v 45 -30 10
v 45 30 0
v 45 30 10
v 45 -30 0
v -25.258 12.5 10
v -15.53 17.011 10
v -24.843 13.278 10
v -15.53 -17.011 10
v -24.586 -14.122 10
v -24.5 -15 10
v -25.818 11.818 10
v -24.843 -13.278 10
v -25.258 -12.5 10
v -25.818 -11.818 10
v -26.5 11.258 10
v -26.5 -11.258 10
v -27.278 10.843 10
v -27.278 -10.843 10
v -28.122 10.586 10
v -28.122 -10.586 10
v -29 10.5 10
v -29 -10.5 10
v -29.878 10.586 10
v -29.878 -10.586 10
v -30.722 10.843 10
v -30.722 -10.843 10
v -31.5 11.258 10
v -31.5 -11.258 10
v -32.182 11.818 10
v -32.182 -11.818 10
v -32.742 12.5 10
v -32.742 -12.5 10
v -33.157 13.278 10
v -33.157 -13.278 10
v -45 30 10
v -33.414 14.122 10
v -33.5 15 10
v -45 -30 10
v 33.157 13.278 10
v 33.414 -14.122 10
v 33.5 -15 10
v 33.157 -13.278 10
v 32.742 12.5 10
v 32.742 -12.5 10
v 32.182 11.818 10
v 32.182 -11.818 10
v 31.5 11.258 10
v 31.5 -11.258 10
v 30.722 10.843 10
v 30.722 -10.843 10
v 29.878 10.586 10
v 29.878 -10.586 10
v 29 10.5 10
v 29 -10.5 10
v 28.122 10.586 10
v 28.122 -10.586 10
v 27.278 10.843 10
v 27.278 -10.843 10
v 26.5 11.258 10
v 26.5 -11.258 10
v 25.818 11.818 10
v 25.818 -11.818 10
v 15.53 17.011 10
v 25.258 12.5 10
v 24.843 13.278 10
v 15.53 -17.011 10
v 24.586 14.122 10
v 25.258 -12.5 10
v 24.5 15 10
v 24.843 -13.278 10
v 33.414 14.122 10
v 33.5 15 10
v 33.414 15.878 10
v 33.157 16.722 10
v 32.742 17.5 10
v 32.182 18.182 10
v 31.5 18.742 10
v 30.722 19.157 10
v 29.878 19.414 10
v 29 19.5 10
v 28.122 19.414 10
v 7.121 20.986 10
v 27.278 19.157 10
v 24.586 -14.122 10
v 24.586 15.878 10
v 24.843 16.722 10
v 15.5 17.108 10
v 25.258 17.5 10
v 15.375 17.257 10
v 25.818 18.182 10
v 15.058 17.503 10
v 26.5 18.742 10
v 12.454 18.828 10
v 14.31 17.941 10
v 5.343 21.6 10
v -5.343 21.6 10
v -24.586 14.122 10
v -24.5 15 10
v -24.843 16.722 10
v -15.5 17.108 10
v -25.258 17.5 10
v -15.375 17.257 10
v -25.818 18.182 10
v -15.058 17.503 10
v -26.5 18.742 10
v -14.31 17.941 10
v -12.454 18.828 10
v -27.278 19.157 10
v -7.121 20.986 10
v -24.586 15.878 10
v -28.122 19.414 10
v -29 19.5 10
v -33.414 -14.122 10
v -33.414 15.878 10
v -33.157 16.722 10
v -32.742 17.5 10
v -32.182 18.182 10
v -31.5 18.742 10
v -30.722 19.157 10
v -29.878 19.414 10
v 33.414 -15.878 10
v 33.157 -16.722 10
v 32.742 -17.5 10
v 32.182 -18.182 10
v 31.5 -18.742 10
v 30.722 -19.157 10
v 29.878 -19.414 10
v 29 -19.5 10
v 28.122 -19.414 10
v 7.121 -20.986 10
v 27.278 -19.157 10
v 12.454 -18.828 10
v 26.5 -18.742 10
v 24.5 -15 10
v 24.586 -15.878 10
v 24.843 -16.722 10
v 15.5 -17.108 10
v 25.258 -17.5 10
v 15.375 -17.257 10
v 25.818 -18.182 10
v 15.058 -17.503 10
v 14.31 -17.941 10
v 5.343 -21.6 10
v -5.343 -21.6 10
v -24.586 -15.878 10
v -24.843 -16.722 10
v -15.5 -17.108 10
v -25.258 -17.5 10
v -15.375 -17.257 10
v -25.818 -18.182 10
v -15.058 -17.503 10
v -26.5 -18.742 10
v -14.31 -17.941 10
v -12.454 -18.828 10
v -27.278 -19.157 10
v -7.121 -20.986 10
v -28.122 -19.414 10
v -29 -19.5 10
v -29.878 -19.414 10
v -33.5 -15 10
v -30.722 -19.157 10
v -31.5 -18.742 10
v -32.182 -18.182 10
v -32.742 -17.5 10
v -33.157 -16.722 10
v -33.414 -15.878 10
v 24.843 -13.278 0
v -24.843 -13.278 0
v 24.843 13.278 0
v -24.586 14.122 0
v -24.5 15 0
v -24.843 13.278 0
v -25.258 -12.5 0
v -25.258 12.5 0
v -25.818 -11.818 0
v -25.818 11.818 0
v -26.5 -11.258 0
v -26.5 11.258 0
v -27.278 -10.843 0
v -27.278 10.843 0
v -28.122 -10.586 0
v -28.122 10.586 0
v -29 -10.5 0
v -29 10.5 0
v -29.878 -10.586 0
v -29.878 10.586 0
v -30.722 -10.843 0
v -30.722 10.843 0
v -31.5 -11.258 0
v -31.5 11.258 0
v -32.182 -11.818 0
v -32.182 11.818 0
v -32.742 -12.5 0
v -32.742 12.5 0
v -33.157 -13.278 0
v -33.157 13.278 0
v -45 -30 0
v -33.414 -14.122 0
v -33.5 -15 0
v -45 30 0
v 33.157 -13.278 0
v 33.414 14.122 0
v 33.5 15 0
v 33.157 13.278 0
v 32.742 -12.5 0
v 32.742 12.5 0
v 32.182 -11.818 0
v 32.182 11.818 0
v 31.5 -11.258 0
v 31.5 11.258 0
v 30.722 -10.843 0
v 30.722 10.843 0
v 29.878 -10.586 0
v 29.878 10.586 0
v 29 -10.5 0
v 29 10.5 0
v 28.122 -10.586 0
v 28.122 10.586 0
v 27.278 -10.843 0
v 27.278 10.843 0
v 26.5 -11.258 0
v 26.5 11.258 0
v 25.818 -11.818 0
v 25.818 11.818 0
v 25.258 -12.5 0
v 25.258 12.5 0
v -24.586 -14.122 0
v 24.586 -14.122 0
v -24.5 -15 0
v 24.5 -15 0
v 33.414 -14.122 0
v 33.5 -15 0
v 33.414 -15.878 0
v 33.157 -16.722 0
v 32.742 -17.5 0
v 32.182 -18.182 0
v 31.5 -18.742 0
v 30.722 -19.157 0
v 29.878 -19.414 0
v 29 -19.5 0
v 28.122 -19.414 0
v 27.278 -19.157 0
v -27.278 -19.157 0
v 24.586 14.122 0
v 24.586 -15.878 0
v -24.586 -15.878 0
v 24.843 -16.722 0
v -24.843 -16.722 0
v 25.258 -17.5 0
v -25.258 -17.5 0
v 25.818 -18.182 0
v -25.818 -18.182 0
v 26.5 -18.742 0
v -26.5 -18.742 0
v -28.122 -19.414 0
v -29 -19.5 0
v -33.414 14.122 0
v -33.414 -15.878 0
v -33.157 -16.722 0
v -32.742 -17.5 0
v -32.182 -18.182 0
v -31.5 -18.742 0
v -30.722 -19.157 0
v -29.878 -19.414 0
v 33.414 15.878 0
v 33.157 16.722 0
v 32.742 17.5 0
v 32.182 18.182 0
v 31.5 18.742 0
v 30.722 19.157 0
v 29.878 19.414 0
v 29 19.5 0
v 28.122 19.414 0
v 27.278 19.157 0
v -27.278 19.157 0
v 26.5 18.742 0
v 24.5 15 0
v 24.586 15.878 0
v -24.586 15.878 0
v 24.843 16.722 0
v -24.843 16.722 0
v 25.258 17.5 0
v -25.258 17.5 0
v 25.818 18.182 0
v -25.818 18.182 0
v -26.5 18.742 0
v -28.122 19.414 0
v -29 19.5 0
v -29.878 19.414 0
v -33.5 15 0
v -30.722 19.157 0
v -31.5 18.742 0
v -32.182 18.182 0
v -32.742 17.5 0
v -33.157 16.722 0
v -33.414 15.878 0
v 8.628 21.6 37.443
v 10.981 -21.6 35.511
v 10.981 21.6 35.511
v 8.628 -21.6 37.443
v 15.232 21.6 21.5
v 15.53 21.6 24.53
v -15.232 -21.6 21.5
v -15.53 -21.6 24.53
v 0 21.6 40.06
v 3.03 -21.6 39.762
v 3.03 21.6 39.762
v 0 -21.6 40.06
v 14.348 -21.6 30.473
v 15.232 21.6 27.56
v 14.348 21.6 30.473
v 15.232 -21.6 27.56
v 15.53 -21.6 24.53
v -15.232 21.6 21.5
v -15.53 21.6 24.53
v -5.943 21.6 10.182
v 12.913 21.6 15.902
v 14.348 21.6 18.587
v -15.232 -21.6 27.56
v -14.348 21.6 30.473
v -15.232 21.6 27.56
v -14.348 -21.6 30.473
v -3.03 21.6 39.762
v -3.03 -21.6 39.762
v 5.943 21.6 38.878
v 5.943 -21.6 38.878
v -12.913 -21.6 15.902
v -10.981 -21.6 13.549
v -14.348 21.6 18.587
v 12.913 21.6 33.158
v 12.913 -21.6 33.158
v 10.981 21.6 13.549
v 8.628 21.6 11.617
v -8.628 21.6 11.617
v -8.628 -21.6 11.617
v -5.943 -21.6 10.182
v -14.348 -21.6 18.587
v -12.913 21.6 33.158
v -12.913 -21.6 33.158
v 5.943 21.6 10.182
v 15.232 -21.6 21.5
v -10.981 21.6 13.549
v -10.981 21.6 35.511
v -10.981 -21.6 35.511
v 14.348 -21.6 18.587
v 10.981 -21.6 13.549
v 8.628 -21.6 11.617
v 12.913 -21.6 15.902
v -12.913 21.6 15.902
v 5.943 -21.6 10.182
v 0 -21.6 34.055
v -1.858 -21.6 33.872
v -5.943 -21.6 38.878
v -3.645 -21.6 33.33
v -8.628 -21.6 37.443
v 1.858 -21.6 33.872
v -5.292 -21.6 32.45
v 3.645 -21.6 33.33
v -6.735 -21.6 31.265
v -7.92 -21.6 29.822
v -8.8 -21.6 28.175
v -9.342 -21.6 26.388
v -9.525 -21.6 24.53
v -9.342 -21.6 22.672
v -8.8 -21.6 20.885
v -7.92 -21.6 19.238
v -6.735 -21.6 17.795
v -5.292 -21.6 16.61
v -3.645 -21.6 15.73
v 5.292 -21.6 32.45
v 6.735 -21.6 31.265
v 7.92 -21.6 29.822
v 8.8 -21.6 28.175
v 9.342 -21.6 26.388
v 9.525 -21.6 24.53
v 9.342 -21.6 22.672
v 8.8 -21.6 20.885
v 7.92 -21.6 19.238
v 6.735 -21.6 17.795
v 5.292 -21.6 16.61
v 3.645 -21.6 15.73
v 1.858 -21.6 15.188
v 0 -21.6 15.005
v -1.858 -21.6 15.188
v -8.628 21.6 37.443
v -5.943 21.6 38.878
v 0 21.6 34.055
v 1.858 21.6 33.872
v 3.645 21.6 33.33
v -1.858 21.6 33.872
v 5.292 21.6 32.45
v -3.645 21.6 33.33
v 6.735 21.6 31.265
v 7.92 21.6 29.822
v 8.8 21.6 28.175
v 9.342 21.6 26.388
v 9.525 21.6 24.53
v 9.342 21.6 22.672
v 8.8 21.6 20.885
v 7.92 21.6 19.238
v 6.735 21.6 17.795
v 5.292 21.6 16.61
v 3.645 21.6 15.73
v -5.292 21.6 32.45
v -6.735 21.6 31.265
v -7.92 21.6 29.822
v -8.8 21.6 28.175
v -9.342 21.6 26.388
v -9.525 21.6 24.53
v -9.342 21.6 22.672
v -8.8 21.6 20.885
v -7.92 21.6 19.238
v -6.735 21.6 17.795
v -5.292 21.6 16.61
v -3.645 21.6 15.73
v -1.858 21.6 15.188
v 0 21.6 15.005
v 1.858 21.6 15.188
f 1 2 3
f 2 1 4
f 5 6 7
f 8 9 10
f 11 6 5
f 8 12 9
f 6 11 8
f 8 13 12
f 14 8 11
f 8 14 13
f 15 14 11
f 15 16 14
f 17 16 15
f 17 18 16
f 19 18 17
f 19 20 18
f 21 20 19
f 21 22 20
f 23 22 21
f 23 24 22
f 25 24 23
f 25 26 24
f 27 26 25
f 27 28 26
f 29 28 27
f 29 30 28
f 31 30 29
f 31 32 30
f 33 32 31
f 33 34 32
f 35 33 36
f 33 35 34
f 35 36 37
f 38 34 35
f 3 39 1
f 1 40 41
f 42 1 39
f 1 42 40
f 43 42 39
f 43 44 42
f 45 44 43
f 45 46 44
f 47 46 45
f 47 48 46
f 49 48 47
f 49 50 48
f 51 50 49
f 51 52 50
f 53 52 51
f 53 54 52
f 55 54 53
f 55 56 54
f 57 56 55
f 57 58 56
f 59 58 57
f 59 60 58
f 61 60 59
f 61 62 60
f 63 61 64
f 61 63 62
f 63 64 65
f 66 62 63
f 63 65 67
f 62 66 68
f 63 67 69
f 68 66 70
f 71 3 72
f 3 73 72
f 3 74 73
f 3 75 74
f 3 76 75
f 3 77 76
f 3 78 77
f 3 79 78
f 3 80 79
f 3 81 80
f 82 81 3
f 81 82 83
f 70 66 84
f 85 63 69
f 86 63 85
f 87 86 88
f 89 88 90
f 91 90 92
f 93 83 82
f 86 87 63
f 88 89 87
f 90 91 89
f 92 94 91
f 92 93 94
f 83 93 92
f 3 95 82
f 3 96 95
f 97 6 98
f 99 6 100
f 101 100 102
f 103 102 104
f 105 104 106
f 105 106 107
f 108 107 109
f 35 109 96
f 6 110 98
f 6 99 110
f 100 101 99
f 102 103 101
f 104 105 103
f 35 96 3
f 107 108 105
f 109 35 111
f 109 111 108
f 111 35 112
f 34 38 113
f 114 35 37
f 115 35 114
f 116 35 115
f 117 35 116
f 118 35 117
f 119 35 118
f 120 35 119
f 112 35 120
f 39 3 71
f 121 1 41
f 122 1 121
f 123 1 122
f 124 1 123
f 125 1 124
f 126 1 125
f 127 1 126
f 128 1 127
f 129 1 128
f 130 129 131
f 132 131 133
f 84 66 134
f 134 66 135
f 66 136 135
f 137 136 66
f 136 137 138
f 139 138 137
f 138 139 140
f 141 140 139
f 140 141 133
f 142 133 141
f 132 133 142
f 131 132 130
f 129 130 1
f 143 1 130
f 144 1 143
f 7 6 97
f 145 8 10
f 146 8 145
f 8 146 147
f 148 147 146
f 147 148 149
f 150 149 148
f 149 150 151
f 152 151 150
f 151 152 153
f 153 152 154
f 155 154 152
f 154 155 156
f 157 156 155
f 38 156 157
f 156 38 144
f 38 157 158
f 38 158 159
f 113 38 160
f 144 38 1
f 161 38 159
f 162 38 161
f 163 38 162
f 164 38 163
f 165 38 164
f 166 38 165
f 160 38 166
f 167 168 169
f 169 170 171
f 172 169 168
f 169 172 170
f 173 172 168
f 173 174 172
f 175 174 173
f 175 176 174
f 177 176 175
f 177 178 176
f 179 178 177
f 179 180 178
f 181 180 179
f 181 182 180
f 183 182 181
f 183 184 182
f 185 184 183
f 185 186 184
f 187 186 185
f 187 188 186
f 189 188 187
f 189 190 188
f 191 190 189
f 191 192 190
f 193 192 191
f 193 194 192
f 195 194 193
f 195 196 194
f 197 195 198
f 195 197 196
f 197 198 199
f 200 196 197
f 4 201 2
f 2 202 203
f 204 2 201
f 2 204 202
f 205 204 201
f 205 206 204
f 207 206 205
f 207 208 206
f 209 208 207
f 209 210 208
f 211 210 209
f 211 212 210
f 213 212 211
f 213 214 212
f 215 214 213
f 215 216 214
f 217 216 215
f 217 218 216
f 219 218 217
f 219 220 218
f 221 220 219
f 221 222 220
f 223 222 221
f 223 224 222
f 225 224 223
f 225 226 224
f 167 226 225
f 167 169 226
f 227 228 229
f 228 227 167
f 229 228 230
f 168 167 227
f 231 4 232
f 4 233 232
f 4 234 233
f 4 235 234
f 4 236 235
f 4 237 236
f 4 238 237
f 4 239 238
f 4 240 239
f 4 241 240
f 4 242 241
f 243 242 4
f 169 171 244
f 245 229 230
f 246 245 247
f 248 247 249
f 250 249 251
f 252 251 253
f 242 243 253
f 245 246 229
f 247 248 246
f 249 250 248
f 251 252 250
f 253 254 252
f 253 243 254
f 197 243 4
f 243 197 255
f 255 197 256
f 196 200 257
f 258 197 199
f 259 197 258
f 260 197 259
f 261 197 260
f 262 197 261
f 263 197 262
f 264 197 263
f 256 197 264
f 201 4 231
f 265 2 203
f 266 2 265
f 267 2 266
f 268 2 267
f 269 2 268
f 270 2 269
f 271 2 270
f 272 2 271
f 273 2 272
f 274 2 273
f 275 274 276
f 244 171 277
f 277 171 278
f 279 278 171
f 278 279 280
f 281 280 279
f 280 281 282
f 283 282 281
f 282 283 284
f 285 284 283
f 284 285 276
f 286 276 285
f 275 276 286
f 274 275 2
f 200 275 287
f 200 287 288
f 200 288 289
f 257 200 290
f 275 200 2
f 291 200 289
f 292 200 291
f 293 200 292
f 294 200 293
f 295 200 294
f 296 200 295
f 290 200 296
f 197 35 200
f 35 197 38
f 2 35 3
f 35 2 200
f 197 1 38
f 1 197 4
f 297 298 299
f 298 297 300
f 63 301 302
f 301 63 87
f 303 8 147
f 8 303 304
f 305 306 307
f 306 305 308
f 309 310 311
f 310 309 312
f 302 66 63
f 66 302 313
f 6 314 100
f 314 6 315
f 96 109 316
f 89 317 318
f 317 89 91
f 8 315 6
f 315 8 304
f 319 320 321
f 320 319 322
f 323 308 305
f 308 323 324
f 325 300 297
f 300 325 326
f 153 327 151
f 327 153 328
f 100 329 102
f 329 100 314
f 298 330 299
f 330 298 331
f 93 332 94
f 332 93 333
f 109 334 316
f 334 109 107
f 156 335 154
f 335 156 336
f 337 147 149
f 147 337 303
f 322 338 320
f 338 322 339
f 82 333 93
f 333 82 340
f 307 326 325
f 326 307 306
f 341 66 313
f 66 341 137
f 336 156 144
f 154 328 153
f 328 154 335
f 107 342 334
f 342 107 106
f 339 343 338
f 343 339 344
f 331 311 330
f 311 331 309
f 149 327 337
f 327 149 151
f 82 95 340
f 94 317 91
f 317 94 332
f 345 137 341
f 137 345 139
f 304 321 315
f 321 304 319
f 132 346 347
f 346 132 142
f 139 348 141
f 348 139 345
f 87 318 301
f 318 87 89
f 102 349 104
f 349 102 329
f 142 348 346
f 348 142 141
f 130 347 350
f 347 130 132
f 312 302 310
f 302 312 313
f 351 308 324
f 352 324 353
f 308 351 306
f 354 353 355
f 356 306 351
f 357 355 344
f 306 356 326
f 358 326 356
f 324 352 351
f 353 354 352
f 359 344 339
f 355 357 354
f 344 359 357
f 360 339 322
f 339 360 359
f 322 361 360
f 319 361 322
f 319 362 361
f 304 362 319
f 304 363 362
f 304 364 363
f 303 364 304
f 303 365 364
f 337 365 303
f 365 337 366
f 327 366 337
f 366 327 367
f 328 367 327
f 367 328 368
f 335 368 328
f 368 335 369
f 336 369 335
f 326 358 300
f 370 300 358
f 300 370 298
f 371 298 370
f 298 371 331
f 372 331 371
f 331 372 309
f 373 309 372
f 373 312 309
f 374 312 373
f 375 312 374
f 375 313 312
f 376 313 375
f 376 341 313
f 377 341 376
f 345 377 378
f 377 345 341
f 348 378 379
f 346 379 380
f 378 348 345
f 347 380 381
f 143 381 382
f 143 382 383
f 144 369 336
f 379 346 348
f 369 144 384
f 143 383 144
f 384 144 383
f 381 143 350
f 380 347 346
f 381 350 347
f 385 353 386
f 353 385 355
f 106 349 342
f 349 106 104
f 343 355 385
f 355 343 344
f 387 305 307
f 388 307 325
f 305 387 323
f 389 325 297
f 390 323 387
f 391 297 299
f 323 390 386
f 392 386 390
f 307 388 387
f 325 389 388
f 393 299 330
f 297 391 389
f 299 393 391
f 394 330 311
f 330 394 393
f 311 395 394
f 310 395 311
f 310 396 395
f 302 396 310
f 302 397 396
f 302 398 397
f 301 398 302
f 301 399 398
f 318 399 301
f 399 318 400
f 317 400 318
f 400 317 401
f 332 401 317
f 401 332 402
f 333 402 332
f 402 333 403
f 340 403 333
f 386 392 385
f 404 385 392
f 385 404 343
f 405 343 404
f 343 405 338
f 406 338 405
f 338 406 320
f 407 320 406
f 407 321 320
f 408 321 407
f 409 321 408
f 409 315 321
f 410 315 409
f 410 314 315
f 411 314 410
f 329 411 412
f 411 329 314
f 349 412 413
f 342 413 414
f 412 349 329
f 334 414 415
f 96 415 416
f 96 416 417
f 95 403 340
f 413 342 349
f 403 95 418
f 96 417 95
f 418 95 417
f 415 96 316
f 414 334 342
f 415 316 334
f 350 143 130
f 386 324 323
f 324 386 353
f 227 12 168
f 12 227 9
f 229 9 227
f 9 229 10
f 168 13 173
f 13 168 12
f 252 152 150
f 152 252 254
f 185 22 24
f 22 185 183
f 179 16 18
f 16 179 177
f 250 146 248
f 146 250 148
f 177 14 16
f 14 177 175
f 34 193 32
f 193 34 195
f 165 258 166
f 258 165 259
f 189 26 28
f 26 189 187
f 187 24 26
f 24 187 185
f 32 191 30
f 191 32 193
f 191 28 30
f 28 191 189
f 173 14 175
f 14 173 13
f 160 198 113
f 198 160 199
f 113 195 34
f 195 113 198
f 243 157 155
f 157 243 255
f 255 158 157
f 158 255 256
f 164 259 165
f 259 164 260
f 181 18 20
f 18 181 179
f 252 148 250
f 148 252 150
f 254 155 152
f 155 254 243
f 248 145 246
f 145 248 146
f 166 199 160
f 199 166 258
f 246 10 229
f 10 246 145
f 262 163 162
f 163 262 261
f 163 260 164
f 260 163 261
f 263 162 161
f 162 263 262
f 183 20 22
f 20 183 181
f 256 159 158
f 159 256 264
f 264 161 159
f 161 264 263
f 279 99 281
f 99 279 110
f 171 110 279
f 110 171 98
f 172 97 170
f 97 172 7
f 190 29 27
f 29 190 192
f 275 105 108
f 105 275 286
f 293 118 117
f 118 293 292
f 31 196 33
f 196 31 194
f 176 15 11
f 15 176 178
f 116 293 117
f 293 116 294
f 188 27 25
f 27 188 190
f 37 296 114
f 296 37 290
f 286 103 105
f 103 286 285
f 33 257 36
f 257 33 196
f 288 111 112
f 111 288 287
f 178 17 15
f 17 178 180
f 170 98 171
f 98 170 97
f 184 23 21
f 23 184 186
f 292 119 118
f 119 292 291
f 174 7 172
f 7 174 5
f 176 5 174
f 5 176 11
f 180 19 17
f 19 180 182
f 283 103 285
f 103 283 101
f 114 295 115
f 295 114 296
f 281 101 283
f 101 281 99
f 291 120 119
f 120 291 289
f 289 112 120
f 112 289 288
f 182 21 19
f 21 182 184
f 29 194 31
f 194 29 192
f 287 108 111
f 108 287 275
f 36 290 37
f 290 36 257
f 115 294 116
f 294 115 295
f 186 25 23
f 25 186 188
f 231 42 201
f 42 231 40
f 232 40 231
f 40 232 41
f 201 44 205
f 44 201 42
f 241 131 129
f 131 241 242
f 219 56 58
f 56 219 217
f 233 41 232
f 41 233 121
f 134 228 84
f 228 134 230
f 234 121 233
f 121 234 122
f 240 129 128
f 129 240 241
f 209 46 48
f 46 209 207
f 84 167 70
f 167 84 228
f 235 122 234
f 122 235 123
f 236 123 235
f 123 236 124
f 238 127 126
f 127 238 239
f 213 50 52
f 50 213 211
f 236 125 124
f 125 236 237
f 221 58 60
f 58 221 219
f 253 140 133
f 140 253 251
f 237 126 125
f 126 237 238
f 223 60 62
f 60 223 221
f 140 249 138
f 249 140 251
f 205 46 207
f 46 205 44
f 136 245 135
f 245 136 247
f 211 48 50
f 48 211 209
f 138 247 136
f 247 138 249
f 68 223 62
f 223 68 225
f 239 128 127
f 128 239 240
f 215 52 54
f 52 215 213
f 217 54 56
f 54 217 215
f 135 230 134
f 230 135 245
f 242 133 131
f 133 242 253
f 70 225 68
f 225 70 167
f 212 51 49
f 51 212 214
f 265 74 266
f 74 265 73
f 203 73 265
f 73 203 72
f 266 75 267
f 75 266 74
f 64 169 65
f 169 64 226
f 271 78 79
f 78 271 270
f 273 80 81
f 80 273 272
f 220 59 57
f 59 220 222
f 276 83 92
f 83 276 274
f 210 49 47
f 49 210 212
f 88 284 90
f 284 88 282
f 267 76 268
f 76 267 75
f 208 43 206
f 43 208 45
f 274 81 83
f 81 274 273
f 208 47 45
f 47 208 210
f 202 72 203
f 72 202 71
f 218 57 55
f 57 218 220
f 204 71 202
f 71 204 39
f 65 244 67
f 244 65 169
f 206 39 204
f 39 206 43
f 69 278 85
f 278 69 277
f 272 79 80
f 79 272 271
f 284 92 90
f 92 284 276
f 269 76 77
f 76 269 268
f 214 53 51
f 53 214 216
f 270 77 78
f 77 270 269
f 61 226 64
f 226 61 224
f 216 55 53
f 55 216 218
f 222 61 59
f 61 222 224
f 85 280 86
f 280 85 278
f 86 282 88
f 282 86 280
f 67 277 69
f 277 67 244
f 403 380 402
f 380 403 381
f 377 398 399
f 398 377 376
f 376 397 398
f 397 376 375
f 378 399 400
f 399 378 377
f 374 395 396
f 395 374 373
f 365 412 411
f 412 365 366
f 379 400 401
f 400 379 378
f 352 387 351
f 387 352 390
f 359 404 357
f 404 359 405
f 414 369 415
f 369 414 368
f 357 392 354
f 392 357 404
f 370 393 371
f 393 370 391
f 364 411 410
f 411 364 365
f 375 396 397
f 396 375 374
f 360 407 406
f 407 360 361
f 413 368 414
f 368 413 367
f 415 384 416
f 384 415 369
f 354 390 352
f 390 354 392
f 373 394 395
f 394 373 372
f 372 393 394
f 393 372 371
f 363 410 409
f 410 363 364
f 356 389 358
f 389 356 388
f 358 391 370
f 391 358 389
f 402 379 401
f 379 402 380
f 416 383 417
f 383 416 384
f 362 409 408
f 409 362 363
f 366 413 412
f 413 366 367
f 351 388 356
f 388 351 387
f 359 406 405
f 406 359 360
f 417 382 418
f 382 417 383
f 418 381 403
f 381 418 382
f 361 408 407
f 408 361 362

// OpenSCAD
$fn = 32;

// ----------------------------------------------------------------------
// Bearing block: 90 x 60 mm base, 19.05 mm bore at 24.53 mm
// ----------------------------------------------------------------------

// --- parameters (mm) ---
base_w = 90;              // base width
base_d = 60;              // base depth
base_t = 10;              // base thickness
bore_d = 19.05;           // shaft / bearing bore
house_r = 15.53;          // housing outer radius
house_len = 43.2;         // housing length along the shaft
foot_w = 31.06;           // foot width under the housing
foot_len = 33.2;          // foot length along the shaft
axis_z = 24.53;           // bore axis height above the base
holes_d = 9;              // mounting holes
hole_x = 29;              // mounting hole spacing

difference() {
  union() {
    /* base plate with its underside on z = 0 */
    translate([0, 0, base_t / 2]) cube([base_w, base_d, base_t], center = true);
    /* hull foot: a straight web blending into the round housing */
    hull() {
      translate([0, 0, base_t - 0.5]) cube([foot_w, foot_len, 1.6], center = true);
      translate([0, 0, axis_z]) rotate([-90, 0, 0]) cylinder(h = house_len, d = 2 * house_r, center = true);
    }
  }
  /* bore through the housing, 2.5 mm clear on both sides */
  translate([0, 0, axis_z]) rotate([-90, 0, 0]) cylinder(h = house_len + 5, d = bore_d, center = true);
  /* mounting holes through the base plate */
  for (hx = [-29, 29]) {
    for (hy = [-15, 15]) {
      translate([hx, hy, -2.5]) cylinder(h = base_t + 5, d = holes_d);
    }
  }
}
